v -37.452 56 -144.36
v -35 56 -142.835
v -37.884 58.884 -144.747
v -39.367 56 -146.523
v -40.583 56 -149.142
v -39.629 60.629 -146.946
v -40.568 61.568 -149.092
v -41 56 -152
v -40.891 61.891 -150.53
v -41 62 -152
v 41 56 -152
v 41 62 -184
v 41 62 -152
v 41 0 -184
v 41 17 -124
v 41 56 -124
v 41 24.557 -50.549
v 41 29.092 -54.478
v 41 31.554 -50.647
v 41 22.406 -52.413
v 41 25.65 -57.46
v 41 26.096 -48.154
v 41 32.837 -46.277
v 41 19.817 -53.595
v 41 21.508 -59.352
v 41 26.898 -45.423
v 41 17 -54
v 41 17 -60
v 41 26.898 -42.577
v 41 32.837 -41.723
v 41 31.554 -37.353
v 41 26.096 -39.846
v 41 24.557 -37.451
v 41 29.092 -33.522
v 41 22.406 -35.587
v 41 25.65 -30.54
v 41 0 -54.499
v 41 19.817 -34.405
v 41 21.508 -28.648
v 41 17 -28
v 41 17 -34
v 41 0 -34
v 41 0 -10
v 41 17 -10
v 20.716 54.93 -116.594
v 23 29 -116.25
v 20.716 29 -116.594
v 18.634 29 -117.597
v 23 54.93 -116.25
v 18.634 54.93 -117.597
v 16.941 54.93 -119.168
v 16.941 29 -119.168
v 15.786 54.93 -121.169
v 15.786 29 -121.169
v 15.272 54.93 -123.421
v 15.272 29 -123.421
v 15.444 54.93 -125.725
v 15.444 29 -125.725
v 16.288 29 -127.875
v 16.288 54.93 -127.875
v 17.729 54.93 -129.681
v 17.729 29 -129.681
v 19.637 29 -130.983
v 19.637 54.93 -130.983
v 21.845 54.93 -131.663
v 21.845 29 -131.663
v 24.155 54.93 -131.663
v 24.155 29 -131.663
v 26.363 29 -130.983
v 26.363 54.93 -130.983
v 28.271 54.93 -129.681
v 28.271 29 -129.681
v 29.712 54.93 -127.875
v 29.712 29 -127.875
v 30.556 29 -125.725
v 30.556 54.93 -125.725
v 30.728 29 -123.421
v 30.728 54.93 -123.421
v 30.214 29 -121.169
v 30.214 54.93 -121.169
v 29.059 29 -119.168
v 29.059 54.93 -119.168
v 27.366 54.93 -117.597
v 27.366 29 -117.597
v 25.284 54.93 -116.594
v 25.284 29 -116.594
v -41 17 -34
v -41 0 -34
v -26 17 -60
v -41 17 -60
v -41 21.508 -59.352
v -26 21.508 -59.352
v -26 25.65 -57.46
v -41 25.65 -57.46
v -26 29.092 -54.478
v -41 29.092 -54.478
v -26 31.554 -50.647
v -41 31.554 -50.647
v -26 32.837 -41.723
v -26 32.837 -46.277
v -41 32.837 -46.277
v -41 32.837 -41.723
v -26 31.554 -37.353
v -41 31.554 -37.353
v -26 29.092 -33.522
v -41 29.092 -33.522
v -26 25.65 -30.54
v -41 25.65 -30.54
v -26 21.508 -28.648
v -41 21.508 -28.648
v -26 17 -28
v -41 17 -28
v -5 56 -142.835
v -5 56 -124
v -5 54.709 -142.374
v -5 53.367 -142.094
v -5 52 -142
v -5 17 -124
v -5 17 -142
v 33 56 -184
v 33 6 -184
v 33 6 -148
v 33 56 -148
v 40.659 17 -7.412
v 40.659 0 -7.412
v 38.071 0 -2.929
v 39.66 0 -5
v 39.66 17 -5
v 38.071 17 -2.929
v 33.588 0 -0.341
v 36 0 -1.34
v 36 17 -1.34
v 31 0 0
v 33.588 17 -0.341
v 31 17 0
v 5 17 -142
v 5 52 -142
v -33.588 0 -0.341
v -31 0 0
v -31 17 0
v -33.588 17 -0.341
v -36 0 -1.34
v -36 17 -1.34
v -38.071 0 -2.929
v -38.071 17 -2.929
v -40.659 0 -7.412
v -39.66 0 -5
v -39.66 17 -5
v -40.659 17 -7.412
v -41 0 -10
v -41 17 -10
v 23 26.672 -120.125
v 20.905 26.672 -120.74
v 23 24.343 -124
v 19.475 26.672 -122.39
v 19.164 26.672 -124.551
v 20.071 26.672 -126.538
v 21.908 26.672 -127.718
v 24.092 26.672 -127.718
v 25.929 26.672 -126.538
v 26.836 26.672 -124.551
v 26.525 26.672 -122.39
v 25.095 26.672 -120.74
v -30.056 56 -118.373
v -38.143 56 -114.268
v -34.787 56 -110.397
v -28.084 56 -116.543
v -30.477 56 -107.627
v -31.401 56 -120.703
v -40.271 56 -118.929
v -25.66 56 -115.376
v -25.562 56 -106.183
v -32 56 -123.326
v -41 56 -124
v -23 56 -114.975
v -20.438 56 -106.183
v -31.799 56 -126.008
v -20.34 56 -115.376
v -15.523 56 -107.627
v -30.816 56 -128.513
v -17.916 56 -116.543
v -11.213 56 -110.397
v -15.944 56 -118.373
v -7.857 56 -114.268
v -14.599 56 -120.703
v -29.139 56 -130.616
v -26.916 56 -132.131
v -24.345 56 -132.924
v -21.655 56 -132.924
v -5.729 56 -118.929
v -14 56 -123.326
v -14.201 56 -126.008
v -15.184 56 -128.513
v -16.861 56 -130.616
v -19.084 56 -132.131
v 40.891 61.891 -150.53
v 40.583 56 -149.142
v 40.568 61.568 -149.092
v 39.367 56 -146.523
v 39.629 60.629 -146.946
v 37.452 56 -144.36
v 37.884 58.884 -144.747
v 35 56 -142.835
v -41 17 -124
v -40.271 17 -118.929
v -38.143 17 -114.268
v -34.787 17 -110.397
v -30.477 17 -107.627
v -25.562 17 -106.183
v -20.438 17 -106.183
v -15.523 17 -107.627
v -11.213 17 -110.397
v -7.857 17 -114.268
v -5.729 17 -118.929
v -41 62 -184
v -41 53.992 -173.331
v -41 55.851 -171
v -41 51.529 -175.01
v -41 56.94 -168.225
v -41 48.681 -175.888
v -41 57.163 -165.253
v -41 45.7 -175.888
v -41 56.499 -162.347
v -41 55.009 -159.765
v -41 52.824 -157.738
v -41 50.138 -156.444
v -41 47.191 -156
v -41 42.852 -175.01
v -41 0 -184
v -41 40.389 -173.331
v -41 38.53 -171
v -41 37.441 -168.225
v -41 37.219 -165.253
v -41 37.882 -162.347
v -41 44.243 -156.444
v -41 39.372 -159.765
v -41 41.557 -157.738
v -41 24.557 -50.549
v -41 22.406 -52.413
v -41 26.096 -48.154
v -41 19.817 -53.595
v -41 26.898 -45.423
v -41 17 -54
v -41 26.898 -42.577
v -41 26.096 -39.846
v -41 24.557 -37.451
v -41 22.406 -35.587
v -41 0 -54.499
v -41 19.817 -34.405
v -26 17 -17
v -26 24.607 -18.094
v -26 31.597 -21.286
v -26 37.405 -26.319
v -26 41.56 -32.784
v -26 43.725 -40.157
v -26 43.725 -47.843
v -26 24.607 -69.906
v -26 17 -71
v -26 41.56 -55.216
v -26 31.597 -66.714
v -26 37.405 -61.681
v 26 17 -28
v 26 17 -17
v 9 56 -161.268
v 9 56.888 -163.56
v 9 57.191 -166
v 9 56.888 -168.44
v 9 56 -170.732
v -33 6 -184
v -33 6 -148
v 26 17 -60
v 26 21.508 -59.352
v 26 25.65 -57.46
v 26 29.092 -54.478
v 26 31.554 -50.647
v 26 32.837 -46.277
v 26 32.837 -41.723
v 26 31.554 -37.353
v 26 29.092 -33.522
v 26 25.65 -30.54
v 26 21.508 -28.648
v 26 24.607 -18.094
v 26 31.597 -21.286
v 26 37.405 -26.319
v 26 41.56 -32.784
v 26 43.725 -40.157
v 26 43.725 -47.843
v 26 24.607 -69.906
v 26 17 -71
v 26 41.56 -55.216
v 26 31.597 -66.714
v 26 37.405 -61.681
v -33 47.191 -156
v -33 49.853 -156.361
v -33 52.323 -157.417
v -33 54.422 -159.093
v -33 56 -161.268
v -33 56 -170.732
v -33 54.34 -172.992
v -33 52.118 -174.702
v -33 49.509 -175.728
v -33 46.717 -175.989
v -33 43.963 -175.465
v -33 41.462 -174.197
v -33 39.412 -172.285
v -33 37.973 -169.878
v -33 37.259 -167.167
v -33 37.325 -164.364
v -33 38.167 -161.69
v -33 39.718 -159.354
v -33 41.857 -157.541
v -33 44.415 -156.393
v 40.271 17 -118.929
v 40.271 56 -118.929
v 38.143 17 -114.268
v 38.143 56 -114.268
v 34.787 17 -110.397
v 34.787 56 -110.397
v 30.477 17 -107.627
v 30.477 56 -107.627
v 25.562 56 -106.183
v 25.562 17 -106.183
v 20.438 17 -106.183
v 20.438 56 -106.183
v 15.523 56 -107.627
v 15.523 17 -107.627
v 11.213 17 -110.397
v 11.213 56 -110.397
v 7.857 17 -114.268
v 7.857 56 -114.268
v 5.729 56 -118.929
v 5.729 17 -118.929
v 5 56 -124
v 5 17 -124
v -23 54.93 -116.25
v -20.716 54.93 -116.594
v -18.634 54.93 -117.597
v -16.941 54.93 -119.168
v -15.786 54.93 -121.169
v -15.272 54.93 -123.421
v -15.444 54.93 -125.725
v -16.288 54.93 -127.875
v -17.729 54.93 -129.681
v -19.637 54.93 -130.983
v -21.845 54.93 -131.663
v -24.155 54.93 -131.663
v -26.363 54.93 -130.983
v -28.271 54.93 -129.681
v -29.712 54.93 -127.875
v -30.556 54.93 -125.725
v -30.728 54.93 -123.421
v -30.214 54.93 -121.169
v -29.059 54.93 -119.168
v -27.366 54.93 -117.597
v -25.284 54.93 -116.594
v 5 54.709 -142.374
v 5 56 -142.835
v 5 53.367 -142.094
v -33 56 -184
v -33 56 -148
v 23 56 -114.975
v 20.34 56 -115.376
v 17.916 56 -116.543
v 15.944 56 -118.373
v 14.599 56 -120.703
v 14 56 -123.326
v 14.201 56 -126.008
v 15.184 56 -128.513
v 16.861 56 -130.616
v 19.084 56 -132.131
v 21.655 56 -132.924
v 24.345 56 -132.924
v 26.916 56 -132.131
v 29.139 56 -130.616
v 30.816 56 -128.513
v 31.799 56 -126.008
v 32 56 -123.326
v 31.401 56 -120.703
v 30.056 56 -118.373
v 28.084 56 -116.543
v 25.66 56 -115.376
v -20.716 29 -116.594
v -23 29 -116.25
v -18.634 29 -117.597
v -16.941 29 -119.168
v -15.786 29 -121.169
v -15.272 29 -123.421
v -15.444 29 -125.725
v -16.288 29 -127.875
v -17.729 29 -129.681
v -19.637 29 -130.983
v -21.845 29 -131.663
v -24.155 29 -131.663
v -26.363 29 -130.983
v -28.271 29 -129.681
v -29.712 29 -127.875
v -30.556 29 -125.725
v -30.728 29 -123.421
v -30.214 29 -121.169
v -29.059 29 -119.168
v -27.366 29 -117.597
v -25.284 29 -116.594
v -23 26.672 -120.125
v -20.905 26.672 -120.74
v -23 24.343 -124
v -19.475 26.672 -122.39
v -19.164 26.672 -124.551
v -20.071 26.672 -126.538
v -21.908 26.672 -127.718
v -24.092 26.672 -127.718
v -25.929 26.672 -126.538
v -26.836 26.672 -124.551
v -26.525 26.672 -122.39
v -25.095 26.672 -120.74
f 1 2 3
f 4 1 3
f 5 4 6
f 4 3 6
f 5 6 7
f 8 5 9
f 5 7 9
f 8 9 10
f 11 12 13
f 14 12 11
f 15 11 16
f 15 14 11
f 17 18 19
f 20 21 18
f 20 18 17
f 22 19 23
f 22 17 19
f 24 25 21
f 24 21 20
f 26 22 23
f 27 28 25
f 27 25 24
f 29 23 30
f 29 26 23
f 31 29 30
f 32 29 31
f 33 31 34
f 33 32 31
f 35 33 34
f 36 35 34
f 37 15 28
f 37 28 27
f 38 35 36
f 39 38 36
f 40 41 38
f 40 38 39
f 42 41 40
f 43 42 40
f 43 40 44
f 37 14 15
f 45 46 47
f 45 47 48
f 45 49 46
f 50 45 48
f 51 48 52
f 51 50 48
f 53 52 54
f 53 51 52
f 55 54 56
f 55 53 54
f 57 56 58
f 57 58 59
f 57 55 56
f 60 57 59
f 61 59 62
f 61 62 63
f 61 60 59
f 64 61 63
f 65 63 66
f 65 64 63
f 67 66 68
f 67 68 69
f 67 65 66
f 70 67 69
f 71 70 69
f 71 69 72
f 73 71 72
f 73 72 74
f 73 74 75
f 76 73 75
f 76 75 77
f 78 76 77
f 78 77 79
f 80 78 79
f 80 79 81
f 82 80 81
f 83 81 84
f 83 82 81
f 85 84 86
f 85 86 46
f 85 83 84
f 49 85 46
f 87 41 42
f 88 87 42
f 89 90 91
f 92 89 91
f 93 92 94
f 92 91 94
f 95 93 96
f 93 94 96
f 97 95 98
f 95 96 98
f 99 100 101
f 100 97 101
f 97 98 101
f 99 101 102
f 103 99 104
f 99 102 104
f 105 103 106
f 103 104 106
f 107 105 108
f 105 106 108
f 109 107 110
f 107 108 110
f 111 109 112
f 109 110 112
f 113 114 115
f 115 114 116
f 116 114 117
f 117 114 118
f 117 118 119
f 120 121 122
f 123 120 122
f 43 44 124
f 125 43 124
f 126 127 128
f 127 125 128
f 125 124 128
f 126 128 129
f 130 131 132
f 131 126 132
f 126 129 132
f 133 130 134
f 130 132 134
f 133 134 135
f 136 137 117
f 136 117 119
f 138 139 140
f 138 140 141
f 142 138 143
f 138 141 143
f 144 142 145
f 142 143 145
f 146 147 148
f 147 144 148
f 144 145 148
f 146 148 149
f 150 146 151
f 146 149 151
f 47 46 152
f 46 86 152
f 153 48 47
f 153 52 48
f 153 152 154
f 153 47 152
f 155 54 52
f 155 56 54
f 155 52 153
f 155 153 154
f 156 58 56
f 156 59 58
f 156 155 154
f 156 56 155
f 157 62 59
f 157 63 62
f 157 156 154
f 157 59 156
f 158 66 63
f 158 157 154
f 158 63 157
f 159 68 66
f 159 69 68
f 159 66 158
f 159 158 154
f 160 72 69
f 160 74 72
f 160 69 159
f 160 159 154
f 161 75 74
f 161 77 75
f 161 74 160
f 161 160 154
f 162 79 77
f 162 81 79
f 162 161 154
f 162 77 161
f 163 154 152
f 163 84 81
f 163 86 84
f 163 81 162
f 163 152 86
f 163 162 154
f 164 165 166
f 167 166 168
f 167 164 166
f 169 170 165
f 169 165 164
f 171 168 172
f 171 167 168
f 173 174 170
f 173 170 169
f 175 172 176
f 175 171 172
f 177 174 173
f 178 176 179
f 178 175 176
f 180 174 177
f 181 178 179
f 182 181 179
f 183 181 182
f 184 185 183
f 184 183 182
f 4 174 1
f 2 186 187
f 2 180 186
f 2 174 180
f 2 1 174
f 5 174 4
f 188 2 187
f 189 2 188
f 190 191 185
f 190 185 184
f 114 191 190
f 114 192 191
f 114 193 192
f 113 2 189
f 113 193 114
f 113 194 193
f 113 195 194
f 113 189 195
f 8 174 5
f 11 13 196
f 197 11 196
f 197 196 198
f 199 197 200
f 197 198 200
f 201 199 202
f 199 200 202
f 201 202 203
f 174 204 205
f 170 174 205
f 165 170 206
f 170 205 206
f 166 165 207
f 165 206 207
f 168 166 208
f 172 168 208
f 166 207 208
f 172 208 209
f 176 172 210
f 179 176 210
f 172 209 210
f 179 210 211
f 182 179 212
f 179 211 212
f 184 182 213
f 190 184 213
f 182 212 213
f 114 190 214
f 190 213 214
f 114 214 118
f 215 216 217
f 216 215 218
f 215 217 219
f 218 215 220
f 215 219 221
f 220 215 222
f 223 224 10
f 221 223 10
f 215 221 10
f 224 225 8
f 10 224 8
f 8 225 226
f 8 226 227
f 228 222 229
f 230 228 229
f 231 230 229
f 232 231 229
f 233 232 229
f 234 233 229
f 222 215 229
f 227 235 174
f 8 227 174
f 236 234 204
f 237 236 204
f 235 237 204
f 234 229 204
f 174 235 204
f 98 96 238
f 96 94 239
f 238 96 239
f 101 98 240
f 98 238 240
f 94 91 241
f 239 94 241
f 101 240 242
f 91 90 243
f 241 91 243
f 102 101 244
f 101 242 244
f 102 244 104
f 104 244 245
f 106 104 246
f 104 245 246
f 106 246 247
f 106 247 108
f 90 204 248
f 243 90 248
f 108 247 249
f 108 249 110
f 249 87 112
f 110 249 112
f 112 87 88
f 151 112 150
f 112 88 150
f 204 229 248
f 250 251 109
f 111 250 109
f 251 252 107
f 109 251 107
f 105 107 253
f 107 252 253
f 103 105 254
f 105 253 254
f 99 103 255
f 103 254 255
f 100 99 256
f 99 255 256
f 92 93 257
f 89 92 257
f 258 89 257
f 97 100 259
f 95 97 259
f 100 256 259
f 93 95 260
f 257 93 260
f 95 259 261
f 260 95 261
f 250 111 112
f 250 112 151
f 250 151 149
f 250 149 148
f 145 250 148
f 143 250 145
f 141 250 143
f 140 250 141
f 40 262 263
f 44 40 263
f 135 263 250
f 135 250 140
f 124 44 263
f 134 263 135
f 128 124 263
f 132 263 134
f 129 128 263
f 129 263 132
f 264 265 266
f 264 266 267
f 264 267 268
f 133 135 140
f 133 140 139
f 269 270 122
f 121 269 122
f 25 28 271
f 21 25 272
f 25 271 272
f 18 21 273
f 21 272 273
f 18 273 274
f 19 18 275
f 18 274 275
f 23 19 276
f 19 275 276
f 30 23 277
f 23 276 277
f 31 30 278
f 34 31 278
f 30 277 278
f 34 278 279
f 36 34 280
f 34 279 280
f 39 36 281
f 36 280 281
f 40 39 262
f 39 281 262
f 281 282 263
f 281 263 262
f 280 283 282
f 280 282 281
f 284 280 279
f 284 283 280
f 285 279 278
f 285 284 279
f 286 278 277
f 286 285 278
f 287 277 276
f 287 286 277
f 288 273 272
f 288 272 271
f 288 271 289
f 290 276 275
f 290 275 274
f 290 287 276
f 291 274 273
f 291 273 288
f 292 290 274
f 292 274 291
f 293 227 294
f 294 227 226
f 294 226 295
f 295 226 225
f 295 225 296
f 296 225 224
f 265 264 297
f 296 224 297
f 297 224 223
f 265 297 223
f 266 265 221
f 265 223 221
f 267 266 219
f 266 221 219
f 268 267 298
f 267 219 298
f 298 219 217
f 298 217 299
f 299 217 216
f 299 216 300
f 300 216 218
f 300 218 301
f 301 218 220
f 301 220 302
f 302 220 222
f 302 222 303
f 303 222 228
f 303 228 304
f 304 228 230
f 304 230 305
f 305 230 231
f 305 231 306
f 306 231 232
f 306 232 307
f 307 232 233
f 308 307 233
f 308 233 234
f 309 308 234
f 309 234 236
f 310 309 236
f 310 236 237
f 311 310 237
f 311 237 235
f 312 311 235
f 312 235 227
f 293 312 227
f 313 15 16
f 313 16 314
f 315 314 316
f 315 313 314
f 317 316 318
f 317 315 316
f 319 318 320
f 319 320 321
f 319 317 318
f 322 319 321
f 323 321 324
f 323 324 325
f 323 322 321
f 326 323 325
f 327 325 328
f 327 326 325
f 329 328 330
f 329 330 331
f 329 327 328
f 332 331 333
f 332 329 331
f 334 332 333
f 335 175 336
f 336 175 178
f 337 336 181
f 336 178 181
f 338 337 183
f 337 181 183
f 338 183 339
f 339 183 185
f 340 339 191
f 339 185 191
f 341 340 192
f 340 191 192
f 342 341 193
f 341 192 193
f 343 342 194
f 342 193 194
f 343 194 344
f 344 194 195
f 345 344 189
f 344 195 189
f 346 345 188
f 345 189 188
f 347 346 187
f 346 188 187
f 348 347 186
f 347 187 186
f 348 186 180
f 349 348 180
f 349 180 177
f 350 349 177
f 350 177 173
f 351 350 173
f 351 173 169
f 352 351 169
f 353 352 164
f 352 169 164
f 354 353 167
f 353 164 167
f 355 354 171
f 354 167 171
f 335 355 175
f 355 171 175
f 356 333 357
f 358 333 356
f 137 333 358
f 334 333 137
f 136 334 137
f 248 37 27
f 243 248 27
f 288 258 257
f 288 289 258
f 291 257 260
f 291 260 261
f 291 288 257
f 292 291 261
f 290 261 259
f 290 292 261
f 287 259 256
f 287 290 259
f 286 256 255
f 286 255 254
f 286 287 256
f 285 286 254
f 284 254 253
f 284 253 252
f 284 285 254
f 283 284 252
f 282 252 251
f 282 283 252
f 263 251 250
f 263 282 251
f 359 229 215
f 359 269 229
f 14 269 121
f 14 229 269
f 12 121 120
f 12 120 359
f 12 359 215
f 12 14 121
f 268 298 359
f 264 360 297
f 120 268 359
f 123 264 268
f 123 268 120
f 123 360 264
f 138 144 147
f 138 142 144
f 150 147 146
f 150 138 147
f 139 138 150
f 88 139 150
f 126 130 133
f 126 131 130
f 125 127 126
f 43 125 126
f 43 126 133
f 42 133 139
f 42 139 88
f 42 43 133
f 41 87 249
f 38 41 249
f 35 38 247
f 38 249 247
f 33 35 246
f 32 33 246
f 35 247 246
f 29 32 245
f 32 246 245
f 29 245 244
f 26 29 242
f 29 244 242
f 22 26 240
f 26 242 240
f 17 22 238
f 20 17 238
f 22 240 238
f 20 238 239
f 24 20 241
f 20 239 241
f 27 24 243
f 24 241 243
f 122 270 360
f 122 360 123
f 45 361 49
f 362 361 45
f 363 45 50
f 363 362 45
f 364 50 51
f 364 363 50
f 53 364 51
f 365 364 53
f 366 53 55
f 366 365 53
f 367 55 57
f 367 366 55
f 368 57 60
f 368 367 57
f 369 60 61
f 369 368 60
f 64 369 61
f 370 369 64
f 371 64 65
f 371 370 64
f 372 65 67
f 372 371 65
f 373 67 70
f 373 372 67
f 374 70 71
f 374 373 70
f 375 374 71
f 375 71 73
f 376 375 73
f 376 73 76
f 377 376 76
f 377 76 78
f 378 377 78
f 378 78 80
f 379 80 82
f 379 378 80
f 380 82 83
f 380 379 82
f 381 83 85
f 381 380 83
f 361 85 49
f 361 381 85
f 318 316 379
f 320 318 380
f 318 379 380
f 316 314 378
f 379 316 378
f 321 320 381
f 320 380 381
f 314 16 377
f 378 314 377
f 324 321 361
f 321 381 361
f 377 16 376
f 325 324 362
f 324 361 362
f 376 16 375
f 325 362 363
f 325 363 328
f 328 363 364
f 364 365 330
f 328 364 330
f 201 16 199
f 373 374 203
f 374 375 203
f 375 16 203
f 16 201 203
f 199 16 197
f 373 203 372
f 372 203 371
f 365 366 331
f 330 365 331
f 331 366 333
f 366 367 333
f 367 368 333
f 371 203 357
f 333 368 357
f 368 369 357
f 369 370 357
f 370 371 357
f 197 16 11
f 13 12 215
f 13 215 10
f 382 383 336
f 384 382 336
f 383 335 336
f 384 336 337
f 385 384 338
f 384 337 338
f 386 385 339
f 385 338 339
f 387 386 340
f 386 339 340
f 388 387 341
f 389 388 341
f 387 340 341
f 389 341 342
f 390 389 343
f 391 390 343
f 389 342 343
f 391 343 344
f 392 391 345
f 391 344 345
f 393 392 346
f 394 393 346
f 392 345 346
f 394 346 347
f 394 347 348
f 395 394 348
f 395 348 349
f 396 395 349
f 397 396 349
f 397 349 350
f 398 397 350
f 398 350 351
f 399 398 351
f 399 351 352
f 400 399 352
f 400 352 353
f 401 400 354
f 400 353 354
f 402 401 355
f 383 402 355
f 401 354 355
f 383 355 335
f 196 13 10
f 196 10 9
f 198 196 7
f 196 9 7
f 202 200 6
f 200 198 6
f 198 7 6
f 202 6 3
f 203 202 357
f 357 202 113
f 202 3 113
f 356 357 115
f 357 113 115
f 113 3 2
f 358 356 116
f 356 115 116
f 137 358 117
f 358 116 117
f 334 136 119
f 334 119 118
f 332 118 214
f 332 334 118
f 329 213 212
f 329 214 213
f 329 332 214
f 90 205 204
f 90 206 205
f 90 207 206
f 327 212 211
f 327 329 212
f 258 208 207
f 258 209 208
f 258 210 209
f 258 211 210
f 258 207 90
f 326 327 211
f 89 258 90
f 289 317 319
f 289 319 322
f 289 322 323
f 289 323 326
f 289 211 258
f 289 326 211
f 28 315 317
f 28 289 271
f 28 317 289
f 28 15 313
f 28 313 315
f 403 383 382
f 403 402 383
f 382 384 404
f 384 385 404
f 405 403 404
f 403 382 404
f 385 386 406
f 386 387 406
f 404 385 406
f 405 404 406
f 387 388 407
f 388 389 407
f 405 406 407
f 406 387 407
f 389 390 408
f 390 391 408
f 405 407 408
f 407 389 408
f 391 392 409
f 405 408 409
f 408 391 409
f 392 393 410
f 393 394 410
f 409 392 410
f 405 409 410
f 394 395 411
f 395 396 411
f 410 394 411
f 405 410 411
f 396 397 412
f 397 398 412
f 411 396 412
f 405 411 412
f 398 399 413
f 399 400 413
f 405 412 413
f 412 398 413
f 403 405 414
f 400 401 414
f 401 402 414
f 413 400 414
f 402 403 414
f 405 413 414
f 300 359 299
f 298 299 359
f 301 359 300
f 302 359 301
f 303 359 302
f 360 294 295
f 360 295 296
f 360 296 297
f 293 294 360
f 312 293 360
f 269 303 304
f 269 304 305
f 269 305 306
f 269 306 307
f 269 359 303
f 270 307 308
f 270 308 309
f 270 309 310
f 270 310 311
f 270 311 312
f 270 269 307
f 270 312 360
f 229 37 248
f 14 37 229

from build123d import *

# Parameters (mm, degrees)
BOSS_EXTRUDE2_DEPTH      = 41
BOSS_EXTRUDE4_DEPTH      = 39
BOSS_EXTRUDE6_DEPTH      = 41
BOSS_EXTRUDE6_DEPTH_BACK = 41
BOSS_EXTRUDE7_DEPTH      = 26
CUT_EXTRUDE1_DEPTH       = 211.770016843
CUT_EXTRUDE5_START       = -6
SKETCH12_W               = 66
SKETCH12_H               = 36
CUT_EXTRUDE5_DEPTH       = 50
FILLET1_R                = 10
SKETCH13_R               = 10
CUT_EXTRUDE6_DEPTH       = 50


with BuildPart() as part:
    # Sketch3 → Boss-Extrude2 (new, symmetric)
    with BuildSketch(Plane(origin=(0, 0, 0), x_dir=(0, 0, -1), z_dir=(1, 0, 0))):
        Polygon((0, 0), (184, 0), (184, 62), (142, 62), (142, 17), (0, 17), align=None)
    extrude(amount=BOSS_EXTRUDE2_DEPTH, both=True)

    # Sketch4 → Boss-Extrude4 (add)
    with BuildSketch(Plane(origin=(0, 17, 0), x_dir=(1, 0, 0), z_dir=(0, 1, 0))):
        with BuildLine():
            Line((41, 142), (41, 124))
            ThreePointArc((41, 124), (23, 106), (5, 124))
            Line((5, 124), (5, 142))
            Line((5, 142), (41, 142))
        make_face()
    boss_extrude4 = extrude(amount=BOSS_EXTRUDE4_DEPTH)

    # Sketch6 → M18 Tapped Hole1 (revolve, cut)
    with BuildSketch(Plane(origin=(23, 56, -124), x_dir=(0, 0, 1), z_dir=(1, 0, 0))):
        Polygon((0, 0), (0, 31.656669797), (7.75, 27), (7.75, 1.06985203), (9.025, 0), align=None)
    m18_tapped_hole1 = revolve(axis=Axis((23, 62.35, -124), (0, -1, 0)), mode=Mode.SUBTRACT)

    # Mirror1: Boss-Extrude4, M18 Tapped Hole1 across plane
    add(boss_extrude4.mirror(Plane(origin=(0, 0, 0), x_dir=(0, 0, 1), z_dir=(1, 0, 0))))
    add(m18_tapped_hole1.mirror(Plane(origin=(0, 0, 0), x_dir=(0, 0, 1), z_dir=(1, 0, 0))), mode=Mode.SUBTRACT)

    # Sketch10 → Boss-Extrude6 (add, two sides: drawn at the far end of the back side and taken through both)
    with BuildSketch(Plane(origin=(0, 0, 0), x_dir=(0, 0, -1), z_dir=(1, 0, 0)).offset(-BOSS_EXTRUDE6_DEPTH_BACK)):
        with BuildLine():
            ThreePointArc((60, 17), (44, 33), (28, 17))
            Line((28, 17), (34, 17))
            ThreePointArc((34, 17), (44, 27), (54, 17))
            Line((54, 17), (60, 17))
        make_face()
    extrude(amount=BOSS_EXTRUDE6_DEPTH + BOSS_EXTRUDE6_DEPTH_BACK)

    # Sketch10<3> → Boss-Extrude7 (add, symmetric)
    with BuildSketch(Plane(origin=(0, 0, 0), x_dir=(0, 0, -1), z_dir=(1, 0, 0))):
        with BuildLine():
            ThreePointArc((71, 17), (44, 44), (17, 17))
            Line((17, 17), (28, 17))
            ThreePointArc((28, 17), (44, 33), (60, 17))
            Line((60, 17), (71, 17))
        make_face()
    extrude(amount=BOSS_EXTRUDE7_DEPTH, both=True)

    # Sketch11 → Cut-Extrude1 (cut, through all)
    with BuildSketch(Plane(origin=(41, 0, 0), x_dir=(0, 0, -1), z_dir=(1, 0, 0))):
        Polygon((54, 17), (34, 17), (34, 0), (54.499323558, 0), align=None)
        with BuildLine():
            ThreePointArc((54, 17), (44, 26.710592894), (34, 17))
            Line((34, 17), (54, 17))
        make_face()
    extrude(amount=-CUT_EXTRUDE1_DEPTH, mode=Mode.SUBTRACT)

    # Sketch12 → Cut-Extrude5 (cut)
    with BuildSketch(Plane.XZ.offset(CUT_EXTRUDE5_START)):
        with Locations((0, -166)):
            Rectangle(SKETCH12_W, SKETCH12_H)
    extrude(amount=-CUT_EXTRUDE5_DEPTH, mode=Mode.SUBTRACT)

    # Fillet1
    # the kernel refuses this fillet: 10 mm, written as the material it takes off along each edge
    with BuildSketch(Plane(origin=(-66, 62, -142), x_dir=(0, -1, 0), z_dir=(1, 0, 0))) as fillet1_piece_1_section:
        with BuildLine():
            CenterArc((FILLET1_R, FILLET1_R), FILLET1_R, 180, 90)
            Line((0, FILLET1_R), (0, 0))
            Line((0, 0), (FILLET1_R, 0))
        make_face()
    fillet1_piece_1 = extrude(amount=132, mode=Mode.PRIVATE)
    fillet1_piece_1 = split(fillet1_piece_1, bisect_by=Plane(origin=(-35.5, 56, -144.437451755), z_dir=(0, 1, 0)), keep=Keep.TOP, mode=Mode.PRIVATE)
    fillet1_piece_1 = split(fillet1_piece_1, bisect_by=Plane(origin=(-5, 60.149499364, -144.437451755), z_dir=(-1, 0, 0)), keep=Keep.TOP, mode=Mode.PRIVATE)
    add(fillet1_piece_1, mode=Mode.SUBTRACT)
    with BuildSketch(Plane(origin=(-66, 62, -142), x_dir=(0, -1, 0), z_dir=(1, 0, 0))) as fillet1_piece_2_section:
        with BuildLine():
            CenterArc((FILLET1_R, FILLET1_R), FILLET1_R, 180, 90)
            Line((0, FILLET1_R), (0, 0))
            Line((0, 0), (FILLET1_R, 0))
        make_face()
    fillet1_piece_2 = extrude(amount=132, mode=Mode.PRIVATE)
    fillet1_piece_2 = split(fillet1_piece_2, bisect_by=Plane(origin=(0, 56, -142.10131848), z_dir=(0, -1, 0)), keep=Keep.TOP, mode=Mode.PRIVATE)
    fillet1_piece_2 = split(fillet1_piece_2, bisect_by=Plane(origin=(5, 54.582513339, -142.10131848), z_dir=(-1, 0, 0)), keep=Keep.TOP, mode=Mode.PRIVATE)
    fillet1_piece_2 = split(fillet1_piece_2, bisect_by=Plane(origin=(-5, 54.582513339, -142.10131848), z_dir=(1, 0, 0)), keep=Keep.TOP, mode=Mode.PRIVATE)
    add(fillet1_piece_2, mode=Mode.SUBTRACT)
    with BuildSketch(Plane(origin=(-66, 62, -142), x_dir=(0, -1, 0), z_dir=(1, 0, 0))) as fillet1_piece_3_section:
        with BuildLine():
            CenterArc((FILLET1_R, FILLET1_R), FILLET1_R, 180, 90)
            Line((0, FILLET1_R), (0, 0))
            Line((0, 0), (FILLET1_R, 0))
        make_face()
    fillet1_piece_3 = extrude(amount=132, mode=Mode.PRIVATE)
    fillet1_piece_3 = split(fillet1_piece_3, bisect_by=Plane(origin=(0, 56, -144.437451755), z_dir=(0, 1, 0)), keep=Keep.TOP, mode=Mode.PRIVATE)
    fillet1_piece_3 = split(fillet1_piece_3, bisect_by=Plane(origin=(5, 60.149499364, -144.437451755), z_dir=(-1, 0, 0)), keep=Keep.TOP, mode=Mode.PRIVATE)
    fillet1_piece_3 = split(fillet1_piece_3, bisect_by=Plane(origin=(-5, 60.149499364, -144.437451755), z_dir=(1, 0, 0)), keep=Keep.TOP, mode=Mode.PRIVATE)
    add(fillet1_piece_3, mode=Mode.SUBTRACT)
    with BuildSketch(Plane(origin=(-66, 62, -142), x_dir=(0, -1, 0), z_dir=(1, 0, 0))) as fillet1_piece_4_section:
        with BuildLine():
            CenterArc((FILLET1_R, FILLET1_R), FILLET1_R, 180, 90)
            Line((0, FILLET1_R), (0, 0))
            Line((0, 0), (FILLET1_R, 0))
        make_face()
    fillet1_piece_4 = extrude(amount=132, mode=Mode.PRIVATE)
    fillet1_piece_4 = split(fillet1_piece_4, bisect_by=Plane(origin=(35.5, 56, -144.437451755), z_dir=(0, 1, 0)), keep=Keep.TOP, mode=Mode.PRIVATE)
    fillet1_piece_4 = split(fillet1_piece_4, bisect_by=Plane(origin=(5, 60.149499364, -144.437451755), z_dir=(1, 0, 0)), keep=Keep.TOP, mode=Mode.PRIVATE)
    add(fillet1_piece_4, mode=Mode.SUBTRACT)
    with BuildSketch(Plane(origin=(41, 87, -142), x_dir=(0, 0, -1), z_dir=(0, -1, 0))) as fillet1_piece_5:
        with BuildLine():
            CenterArc((FILLET1_R, -FILLET1_R), FILLET1_R, 90, 90)
            Line((0, -FILLET1_R), (0, 0))
            Line((0, 0), (FILLET1_R, 0))
        make_face()
    extrude(amount=31, mode=Mode.SUBTRACT)
    with BuildSketch(Plane(origin=(-41, 87, -142), x_dir=(0, 0, -1), z_dir=(0, -1, 0))) as fillet1_piece_6:
        with BuildLine():
            CenterArc((FILLET1_R, FILLET1_R), FILLET1_R, 180, 90)
            Line((0, FILLET1_R), (0, 0))
            Line((0, 0), (FILLET1_R, 0))
        make_face()
    extrude(amount=31, mode=Mode.SUBTRACT)
    with BuildSketch(Plane(origin=(-41, 42, 0), x_dir=(1, 0, 0), z_dir=(0, -1, 0))) as fillet1_piece_7:
        with BuildLine():
            CenterArc((FILLET1_R, -FILLET1_R), FILLET1_R, 90, 90)
            Line((0, -FILLET1_R), (0, 0))
            Line((0, 0), (FILLET1_R, 0))
        make_face()
    extrude(amount=67, mode=Mode.SUBTRACT)
    with BuildSketch(Plane(origin=(41, 42, 0), x_dir=(-1, 0, 0), z_dir=(0, -1, 0))) as fillet1_piece_8:
        with BuildLine():
            CenterArc((FILLET1_R, FILLET1_R), FILLET1_R, 180, 90)
            Line((0, FILLET1_R), (0, 0))
            Line((0, 0), (FILLET1_R, 0))
        make_face()
    extrude(amount=67, mode=Mode.SUBTRACT)

    # Sketch13 → Cut-Extrude6 (cut)
    with BuildSketch(Plane.ZY.offset(41)):
        with Locations((-166, 47.190644355)):
            Circle(SKETCH13_R)
    extrude(amount=-CUT_EXTRUDE6_DEPTH, mode=Mode.SUBTRACT)


solid = part.part
